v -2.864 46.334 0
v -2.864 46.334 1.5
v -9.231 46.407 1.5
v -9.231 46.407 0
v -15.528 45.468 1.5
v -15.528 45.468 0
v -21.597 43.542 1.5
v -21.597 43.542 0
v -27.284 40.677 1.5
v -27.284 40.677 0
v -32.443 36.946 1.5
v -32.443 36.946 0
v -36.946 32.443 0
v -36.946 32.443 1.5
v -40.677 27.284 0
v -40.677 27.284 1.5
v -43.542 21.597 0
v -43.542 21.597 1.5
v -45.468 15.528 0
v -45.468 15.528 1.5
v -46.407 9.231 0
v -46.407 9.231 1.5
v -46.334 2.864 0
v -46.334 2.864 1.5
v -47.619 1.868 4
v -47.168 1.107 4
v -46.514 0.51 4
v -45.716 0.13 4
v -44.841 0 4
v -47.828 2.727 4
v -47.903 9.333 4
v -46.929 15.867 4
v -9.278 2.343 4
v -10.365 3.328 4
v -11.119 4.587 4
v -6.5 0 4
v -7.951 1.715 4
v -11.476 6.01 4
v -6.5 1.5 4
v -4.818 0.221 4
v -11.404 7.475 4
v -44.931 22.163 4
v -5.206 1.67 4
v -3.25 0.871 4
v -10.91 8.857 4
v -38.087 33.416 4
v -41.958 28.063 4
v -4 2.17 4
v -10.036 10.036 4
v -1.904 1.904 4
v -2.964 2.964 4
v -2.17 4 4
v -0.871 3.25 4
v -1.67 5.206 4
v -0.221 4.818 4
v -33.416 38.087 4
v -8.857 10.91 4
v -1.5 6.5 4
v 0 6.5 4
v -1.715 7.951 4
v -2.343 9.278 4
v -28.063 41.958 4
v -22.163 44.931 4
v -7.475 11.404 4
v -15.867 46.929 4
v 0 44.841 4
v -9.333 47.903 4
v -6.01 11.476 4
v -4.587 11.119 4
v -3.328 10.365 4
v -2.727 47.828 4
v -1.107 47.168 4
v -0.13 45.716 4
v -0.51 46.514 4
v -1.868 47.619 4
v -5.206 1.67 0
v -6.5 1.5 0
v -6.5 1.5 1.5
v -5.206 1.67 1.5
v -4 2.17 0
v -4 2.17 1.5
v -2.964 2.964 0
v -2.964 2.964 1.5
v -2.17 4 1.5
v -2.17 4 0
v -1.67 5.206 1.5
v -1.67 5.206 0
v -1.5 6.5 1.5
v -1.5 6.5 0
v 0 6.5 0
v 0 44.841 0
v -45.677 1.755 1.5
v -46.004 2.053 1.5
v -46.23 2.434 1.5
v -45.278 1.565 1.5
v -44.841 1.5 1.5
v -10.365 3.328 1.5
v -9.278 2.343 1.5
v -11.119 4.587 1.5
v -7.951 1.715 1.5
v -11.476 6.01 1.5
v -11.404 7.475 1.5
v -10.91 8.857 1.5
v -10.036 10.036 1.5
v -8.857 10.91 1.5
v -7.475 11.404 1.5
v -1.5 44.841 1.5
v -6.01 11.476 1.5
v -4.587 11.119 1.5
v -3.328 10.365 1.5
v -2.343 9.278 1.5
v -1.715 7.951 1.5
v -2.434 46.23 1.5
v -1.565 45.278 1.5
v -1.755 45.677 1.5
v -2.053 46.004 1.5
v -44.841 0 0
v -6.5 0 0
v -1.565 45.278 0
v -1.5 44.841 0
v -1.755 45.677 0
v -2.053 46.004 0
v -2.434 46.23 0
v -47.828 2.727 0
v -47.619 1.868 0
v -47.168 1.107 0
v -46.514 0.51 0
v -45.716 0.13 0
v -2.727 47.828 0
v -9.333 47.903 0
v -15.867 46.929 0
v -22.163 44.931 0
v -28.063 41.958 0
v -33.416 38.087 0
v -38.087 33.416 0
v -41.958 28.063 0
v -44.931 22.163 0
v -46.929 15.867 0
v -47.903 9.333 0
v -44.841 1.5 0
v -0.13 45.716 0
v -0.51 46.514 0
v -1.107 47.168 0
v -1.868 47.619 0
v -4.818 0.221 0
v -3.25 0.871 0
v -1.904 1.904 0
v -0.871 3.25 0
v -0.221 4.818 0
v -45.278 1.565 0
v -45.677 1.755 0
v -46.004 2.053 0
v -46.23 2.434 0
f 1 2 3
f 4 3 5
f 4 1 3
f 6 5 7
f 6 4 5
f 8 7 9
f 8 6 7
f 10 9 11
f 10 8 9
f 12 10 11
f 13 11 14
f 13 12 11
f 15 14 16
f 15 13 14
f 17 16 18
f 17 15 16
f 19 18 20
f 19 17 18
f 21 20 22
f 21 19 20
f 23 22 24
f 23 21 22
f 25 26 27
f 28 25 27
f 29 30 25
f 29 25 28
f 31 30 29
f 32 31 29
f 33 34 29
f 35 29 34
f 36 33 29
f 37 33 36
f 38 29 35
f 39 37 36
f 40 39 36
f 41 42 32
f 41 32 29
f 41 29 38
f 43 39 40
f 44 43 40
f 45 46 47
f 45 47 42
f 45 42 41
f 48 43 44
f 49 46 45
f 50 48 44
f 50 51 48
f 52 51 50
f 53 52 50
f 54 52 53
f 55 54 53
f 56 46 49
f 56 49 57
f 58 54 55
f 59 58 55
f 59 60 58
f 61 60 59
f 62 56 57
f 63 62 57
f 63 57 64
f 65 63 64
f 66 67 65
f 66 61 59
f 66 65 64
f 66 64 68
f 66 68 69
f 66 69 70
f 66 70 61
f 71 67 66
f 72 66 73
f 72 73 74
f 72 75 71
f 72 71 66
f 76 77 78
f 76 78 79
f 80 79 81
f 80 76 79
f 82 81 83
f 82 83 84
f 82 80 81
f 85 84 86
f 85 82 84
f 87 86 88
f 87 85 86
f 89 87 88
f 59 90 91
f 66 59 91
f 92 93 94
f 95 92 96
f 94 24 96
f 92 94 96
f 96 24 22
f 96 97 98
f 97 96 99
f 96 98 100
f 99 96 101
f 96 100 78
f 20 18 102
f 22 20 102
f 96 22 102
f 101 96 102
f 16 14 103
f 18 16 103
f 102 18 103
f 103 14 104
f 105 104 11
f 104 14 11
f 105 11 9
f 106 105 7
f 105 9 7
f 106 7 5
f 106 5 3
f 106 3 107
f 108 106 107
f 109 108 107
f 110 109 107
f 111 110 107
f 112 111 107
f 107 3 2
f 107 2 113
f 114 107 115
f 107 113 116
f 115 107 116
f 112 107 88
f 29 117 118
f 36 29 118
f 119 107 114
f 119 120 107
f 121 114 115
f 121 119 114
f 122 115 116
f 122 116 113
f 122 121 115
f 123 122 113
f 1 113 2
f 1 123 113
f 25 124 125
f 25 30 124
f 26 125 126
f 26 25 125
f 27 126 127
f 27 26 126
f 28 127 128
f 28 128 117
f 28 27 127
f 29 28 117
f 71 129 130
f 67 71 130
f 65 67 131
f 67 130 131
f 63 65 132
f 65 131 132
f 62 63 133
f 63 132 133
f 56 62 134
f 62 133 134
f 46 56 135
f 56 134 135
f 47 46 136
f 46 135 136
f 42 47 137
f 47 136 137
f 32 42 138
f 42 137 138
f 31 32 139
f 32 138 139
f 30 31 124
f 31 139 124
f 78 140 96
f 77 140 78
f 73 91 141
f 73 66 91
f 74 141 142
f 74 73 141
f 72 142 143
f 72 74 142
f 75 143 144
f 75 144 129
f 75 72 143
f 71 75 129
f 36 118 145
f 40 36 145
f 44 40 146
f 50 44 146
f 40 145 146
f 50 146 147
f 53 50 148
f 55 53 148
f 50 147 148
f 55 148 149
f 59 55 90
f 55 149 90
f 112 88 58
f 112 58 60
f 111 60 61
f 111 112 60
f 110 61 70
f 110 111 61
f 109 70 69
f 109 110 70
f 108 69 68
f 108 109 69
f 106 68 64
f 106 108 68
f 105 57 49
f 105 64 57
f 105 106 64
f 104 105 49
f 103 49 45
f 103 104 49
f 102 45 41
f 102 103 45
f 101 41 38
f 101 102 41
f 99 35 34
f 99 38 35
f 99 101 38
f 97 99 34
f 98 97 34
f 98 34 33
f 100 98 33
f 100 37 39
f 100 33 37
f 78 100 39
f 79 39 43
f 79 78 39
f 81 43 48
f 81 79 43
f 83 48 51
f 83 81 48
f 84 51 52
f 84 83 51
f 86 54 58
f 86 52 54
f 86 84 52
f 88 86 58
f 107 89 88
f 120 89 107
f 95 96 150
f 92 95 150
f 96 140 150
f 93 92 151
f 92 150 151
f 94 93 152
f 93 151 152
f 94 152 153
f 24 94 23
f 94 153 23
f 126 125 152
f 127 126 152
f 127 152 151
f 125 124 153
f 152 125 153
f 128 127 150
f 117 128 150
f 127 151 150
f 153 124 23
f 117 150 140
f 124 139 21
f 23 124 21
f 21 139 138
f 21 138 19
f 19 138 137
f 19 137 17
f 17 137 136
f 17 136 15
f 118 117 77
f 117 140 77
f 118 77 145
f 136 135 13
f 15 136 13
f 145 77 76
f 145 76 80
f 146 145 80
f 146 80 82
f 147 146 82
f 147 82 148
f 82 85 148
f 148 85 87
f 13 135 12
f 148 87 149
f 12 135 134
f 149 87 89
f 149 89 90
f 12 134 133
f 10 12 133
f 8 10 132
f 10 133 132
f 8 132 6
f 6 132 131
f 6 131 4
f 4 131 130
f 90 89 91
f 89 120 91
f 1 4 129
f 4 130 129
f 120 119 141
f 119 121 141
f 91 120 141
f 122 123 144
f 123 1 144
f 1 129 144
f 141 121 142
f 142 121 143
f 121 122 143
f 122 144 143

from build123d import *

# Parameters (mm, degrees)
F1_DEPTH = 4
F2_T     = -1.5
F5_DEPTH = 2.5
F6_R     = 1.5
F7_R     = 3
F9_DEPTH = 4.001


with BuildPart() as f1:
    # F0 (on Top) → F1 (new body)
    with BuildSketch(Plane.XY):
        with BuildLine():
            ThreePointArc((-6.5, 0), (-1.9038059223, 1.9038059223), (0, 6.5))
            Line((0, 6.5), (0, 47.4878030638))
            ThreePointArc((0, 47.4878030638), (-35.8449314192, 35.8449314192), (-47.4878030638, 0))
            Line((-47.4878030638, 0), (-13, 0))
            Line((-13, 0), (-6.5, 0))
        make_face()
    extrude(amount=F1_DEPTH)

    # F2
    f2_openings = [f1.faces().sort_by_distance(p)[0] for p in [
        (-21.274509, 21.274509, 4),
        (-21.274509, 21.274509, 0),
    ]]
    offset(amount=F2_T, openings=f2_openings)

    # F4 (on offset) → F5 (join)
    with BuildSketch(Plane.XY.offset(1.5)):
        with BuildLine():
            Line((-46.186269666, 1.5), (-6.5, 1.5))
            ThreePointArc((-6.5, 1.5), (-2.9644660941, 2.9644660941), (-1.5, 6.5))
            Line((-1.5, 6.5), (-1.5, 46.186269666))
            ThreePointArc((-1.5, 46.186269666), (-34.7842712475, 34.7842712475), (-46.186269666, 1.5))
        make_face()
    extrude(amount=F5_DEPTH)

    # F6
    f6_edges = [f1.edges().sort_by_distance(p)[0] for p in [
        (-1.5, 46.18627, 0.75),
        (-46.18627, 1.5, 0.75),
    ]]
    fillet(f6_edges, radius=F6_R)

    # F7
    f7_edges = [f1.edges().sort_by_distance(p)[0] for p in [
        (-47.487803, 0, 2),
        (0, 47.487803, 2),
    ]]
    fillet(f7_edges, radius=F7_R)

    # F8 (on face) → F9 (cut, through all)
    with BuildSketch(Plane(origin=(0, 0, 0), x_dir=(1, 0, 0), z_dir=(0, 0, -1))):
        with BuildLine():
            ThreePointArc((-1.5, -6.5), (-2.9644660941, -2.9644660941), (-6.5, -1.5))
            ThreePointArc((-6.5, -1.5), (-10.0355339059, -10.0355339059), (-1.5, -6.5))
        make_face()
    extrude(amount=-F9_DEPTH, mode=Mode.SUBTRACT)


solid = f1.part
